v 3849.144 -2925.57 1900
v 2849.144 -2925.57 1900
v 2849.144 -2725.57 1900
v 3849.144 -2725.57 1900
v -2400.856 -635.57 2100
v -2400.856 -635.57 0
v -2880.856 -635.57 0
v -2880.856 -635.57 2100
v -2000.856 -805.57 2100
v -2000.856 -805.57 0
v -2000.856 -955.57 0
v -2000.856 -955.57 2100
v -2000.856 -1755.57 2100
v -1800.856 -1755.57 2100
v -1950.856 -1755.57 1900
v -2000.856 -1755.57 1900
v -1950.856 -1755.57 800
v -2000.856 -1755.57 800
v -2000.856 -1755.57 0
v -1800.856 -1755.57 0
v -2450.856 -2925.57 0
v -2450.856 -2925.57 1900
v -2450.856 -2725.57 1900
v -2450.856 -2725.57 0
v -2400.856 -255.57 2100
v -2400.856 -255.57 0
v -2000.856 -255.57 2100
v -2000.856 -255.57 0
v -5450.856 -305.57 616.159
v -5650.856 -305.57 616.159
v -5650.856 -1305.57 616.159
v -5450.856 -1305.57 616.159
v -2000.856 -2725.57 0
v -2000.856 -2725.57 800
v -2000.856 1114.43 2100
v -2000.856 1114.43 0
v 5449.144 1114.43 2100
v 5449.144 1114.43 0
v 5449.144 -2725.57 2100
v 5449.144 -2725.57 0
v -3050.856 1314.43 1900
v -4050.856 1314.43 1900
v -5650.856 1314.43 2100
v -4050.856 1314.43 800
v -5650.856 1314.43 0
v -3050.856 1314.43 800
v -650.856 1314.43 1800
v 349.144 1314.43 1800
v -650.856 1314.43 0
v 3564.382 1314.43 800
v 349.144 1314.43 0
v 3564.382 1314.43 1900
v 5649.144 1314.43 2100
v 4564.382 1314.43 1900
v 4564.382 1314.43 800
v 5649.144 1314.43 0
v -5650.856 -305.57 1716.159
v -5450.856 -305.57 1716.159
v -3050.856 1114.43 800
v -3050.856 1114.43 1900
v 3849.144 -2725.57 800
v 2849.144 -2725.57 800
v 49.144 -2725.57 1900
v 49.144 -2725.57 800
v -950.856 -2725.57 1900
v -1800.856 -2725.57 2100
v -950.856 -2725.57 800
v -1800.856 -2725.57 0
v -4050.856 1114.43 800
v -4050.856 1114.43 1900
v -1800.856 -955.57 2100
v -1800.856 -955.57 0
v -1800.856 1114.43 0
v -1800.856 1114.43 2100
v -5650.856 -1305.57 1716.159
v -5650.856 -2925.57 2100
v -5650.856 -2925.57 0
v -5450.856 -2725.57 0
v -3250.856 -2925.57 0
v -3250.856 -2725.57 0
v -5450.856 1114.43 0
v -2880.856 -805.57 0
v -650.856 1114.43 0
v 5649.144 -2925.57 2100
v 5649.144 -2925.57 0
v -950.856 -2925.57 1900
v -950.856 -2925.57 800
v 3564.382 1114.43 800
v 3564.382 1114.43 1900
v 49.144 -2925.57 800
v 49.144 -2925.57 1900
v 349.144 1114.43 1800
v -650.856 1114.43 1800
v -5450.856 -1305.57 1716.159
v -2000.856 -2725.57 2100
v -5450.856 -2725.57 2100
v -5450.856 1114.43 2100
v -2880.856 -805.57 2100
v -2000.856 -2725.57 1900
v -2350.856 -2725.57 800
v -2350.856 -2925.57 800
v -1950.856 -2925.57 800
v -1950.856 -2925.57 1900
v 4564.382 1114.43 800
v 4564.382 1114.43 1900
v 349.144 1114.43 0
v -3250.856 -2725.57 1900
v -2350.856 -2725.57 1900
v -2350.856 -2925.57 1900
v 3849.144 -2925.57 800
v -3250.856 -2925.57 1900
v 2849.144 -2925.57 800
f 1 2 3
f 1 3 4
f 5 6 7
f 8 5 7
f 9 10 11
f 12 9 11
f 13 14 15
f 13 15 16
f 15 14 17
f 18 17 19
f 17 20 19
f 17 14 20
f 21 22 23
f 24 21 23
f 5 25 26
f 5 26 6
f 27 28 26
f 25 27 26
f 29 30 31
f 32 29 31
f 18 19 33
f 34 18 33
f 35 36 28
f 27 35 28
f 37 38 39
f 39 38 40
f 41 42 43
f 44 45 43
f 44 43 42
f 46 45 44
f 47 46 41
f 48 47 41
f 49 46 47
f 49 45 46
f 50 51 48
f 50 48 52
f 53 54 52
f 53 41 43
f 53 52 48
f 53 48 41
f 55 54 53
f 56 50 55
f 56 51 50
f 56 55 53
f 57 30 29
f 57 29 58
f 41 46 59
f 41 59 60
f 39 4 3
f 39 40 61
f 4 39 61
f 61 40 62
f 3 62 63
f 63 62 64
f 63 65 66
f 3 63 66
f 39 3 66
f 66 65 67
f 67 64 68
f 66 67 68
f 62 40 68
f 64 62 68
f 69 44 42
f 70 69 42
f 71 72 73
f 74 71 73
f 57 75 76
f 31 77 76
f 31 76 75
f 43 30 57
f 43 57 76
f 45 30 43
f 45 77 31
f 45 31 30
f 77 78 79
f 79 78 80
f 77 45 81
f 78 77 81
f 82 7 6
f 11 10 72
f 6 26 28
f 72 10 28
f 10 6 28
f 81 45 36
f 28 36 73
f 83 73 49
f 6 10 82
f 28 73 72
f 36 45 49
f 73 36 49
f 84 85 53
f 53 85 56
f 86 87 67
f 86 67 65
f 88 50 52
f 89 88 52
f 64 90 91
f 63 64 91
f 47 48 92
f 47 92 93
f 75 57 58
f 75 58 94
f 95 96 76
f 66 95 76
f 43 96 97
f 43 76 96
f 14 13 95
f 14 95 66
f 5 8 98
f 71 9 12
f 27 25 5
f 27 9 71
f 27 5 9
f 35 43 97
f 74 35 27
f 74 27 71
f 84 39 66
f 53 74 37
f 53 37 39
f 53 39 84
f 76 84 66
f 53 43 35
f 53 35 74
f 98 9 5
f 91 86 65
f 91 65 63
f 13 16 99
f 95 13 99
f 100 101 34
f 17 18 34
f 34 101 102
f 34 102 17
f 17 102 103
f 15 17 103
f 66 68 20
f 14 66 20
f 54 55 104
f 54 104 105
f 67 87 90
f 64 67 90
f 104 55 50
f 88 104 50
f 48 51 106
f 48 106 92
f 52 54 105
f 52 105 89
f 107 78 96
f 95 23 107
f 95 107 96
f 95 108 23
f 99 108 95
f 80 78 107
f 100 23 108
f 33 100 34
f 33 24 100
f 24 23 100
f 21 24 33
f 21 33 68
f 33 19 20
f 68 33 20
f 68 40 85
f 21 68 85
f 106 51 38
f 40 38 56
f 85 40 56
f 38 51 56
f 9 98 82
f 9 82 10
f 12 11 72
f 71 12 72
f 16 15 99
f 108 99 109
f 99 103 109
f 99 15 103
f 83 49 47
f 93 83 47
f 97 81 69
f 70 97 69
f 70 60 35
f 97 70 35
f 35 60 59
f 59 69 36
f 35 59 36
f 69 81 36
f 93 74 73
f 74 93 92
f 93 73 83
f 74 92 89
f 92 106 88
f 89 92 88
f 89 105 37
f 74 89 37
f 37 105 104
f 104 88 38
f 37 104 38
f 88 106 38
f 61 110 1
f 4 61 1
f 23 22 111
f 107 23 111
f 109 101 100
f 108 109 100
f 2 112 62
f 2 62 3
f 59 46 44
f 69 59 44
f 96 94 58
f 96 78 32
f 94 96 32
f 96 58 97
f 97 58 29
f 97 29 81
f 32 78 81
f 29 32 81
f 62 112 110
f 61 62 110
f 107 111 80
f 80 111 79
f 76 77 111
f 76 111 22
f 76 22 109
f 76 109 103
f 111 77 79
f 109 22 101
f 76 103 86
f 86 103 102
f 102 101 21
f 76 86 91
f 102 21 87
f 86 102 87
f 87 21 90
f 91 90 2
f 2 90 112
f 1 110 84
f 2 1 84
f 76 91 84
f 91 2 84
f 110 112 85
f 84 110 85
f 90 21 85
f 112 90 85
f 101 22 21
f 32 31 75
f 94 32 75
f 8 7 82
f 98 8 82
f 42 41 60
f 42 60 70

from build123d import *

# Parameters (mm, degrees)
F0_W     = 11300
F0_H     = 4240
F1_DEPTH = 2100
F2_W     = 1000
F2_H     = 1100
F2_W_2   = 500
F5_DEPTH = 1170.001
F3_W     = 1000
F3_H     = 1100
F6_DEPTH = 200
F4_W     = 1000
F4_H     = 1100
F4_H_2   = 1800
F7_DEPTH = 200
F8_W     = 100
F8_H     = 200
F9_DEPTH = 1100


with BuildPart() as f1:
    # F0 (on Top) → F1 (new body)
    with BuildSketch(Plane.XY):
        with Locations((-0.8559785783, -805.5703551552)):
            Rectangle(F0_W, F0_H)
        Polygon((-2000.8559785783, -2725.5703551552), (-5450.8559785783, -2725.5703551552), (-5450.8559785783, 1114.4296448448), (-2000.8559785783, 1114.4296448448), (-2000.8559785783, -255.5703551552), (-2400.8559785783, -255.5703551552), (-2400.8559785783, -635.5703551552), (-2880.8559785783, -635.5703551552), (-2880.8559785783, -805.5703551552), (-2000.8559785783, -805.5703551552), (-2000.8559785783, -955.5703551552), (-1800.8559785783, -955.5703551552), (-1800.8559785783, 1114.4296448448), (5449.1440214217, 1114.4296448448), (5449.1440214217, -2725.5703551552), (-1800.8559785783, -2725.5703551552), (-1800.8559785783, -1755.5703551552), (-2000.8559785783, -1755.5703551552), align=None, mode=Mode.SUBTRACT)
    extrude(amount=F1_DEPTH)

    # F2 (on face) → F5 (cut, through all)
    with BuildSketch(Plane.XZ.offset(2925.5703551552)):
        with Locations((3349.1440214217, 1350)):
            Rectangle(F2_W, F2_H)
        with Locations((-450.8559785783, 1350)):
            Rectangle(F2_W, F2_H)
        with Locations((-2200.8559785783, 1350)):
            Rectangle(F2_W_2, F2_H)
        Polygon((-2450.8559785783, 800), (-2450.8559785783, 1900), (-3250.8559785783, 1900), (-3250.8559785783, 0), (-2450.8559785783, 0), align=None)
    extrude(amount=-F5_DEPTH, mode=Mode.SUBTRACT)

    # F3 (on face) → F6 (cut, through all)
    with BuildSketch(Plane(origin=(-5650.8559785783, 0, 0), x_dir=(0, -1, 0), z_dir=(-1, 0, 0))):
        with Locations((805.5703551552, 1166.1593914032)):
            Rectangle(F3_W, F3_H)
    extrude(amount=-F6_DEPTH, mode=Mode.SUBTRACT)

    # F4 (on face) → F7 (cut, through all)
    with BuildSketch(Plane(origin=(0, 1314.4296448448, 0), x_dir=(-1, 0, 0), z_dir=(0, 1, 0))):
        with Locations((-4064.3822494507, 1350)):
            Rectangle(F4_W, F4_H)
        with Locations((150.8559785783, 900)):
            Rectangle(F4_W, F4_H_2)
        with Locations((3550.8559785783, 1350)):
            Rectangle(F4_W, F4_H)
    extrude(amount=-F7_DEPTH, mode=Mode.SUBTRACT)

    # F8 (on face) → F9 (join, through all)
    with BuildSketch(Plane.XY.offset(800)):
        with Locations((-2400.8559785783, -2825.5703551552)):
            Rectangle(F8_W, F8_H)
    extrude(amount=F9_DEPTH)


solid = f1.part
